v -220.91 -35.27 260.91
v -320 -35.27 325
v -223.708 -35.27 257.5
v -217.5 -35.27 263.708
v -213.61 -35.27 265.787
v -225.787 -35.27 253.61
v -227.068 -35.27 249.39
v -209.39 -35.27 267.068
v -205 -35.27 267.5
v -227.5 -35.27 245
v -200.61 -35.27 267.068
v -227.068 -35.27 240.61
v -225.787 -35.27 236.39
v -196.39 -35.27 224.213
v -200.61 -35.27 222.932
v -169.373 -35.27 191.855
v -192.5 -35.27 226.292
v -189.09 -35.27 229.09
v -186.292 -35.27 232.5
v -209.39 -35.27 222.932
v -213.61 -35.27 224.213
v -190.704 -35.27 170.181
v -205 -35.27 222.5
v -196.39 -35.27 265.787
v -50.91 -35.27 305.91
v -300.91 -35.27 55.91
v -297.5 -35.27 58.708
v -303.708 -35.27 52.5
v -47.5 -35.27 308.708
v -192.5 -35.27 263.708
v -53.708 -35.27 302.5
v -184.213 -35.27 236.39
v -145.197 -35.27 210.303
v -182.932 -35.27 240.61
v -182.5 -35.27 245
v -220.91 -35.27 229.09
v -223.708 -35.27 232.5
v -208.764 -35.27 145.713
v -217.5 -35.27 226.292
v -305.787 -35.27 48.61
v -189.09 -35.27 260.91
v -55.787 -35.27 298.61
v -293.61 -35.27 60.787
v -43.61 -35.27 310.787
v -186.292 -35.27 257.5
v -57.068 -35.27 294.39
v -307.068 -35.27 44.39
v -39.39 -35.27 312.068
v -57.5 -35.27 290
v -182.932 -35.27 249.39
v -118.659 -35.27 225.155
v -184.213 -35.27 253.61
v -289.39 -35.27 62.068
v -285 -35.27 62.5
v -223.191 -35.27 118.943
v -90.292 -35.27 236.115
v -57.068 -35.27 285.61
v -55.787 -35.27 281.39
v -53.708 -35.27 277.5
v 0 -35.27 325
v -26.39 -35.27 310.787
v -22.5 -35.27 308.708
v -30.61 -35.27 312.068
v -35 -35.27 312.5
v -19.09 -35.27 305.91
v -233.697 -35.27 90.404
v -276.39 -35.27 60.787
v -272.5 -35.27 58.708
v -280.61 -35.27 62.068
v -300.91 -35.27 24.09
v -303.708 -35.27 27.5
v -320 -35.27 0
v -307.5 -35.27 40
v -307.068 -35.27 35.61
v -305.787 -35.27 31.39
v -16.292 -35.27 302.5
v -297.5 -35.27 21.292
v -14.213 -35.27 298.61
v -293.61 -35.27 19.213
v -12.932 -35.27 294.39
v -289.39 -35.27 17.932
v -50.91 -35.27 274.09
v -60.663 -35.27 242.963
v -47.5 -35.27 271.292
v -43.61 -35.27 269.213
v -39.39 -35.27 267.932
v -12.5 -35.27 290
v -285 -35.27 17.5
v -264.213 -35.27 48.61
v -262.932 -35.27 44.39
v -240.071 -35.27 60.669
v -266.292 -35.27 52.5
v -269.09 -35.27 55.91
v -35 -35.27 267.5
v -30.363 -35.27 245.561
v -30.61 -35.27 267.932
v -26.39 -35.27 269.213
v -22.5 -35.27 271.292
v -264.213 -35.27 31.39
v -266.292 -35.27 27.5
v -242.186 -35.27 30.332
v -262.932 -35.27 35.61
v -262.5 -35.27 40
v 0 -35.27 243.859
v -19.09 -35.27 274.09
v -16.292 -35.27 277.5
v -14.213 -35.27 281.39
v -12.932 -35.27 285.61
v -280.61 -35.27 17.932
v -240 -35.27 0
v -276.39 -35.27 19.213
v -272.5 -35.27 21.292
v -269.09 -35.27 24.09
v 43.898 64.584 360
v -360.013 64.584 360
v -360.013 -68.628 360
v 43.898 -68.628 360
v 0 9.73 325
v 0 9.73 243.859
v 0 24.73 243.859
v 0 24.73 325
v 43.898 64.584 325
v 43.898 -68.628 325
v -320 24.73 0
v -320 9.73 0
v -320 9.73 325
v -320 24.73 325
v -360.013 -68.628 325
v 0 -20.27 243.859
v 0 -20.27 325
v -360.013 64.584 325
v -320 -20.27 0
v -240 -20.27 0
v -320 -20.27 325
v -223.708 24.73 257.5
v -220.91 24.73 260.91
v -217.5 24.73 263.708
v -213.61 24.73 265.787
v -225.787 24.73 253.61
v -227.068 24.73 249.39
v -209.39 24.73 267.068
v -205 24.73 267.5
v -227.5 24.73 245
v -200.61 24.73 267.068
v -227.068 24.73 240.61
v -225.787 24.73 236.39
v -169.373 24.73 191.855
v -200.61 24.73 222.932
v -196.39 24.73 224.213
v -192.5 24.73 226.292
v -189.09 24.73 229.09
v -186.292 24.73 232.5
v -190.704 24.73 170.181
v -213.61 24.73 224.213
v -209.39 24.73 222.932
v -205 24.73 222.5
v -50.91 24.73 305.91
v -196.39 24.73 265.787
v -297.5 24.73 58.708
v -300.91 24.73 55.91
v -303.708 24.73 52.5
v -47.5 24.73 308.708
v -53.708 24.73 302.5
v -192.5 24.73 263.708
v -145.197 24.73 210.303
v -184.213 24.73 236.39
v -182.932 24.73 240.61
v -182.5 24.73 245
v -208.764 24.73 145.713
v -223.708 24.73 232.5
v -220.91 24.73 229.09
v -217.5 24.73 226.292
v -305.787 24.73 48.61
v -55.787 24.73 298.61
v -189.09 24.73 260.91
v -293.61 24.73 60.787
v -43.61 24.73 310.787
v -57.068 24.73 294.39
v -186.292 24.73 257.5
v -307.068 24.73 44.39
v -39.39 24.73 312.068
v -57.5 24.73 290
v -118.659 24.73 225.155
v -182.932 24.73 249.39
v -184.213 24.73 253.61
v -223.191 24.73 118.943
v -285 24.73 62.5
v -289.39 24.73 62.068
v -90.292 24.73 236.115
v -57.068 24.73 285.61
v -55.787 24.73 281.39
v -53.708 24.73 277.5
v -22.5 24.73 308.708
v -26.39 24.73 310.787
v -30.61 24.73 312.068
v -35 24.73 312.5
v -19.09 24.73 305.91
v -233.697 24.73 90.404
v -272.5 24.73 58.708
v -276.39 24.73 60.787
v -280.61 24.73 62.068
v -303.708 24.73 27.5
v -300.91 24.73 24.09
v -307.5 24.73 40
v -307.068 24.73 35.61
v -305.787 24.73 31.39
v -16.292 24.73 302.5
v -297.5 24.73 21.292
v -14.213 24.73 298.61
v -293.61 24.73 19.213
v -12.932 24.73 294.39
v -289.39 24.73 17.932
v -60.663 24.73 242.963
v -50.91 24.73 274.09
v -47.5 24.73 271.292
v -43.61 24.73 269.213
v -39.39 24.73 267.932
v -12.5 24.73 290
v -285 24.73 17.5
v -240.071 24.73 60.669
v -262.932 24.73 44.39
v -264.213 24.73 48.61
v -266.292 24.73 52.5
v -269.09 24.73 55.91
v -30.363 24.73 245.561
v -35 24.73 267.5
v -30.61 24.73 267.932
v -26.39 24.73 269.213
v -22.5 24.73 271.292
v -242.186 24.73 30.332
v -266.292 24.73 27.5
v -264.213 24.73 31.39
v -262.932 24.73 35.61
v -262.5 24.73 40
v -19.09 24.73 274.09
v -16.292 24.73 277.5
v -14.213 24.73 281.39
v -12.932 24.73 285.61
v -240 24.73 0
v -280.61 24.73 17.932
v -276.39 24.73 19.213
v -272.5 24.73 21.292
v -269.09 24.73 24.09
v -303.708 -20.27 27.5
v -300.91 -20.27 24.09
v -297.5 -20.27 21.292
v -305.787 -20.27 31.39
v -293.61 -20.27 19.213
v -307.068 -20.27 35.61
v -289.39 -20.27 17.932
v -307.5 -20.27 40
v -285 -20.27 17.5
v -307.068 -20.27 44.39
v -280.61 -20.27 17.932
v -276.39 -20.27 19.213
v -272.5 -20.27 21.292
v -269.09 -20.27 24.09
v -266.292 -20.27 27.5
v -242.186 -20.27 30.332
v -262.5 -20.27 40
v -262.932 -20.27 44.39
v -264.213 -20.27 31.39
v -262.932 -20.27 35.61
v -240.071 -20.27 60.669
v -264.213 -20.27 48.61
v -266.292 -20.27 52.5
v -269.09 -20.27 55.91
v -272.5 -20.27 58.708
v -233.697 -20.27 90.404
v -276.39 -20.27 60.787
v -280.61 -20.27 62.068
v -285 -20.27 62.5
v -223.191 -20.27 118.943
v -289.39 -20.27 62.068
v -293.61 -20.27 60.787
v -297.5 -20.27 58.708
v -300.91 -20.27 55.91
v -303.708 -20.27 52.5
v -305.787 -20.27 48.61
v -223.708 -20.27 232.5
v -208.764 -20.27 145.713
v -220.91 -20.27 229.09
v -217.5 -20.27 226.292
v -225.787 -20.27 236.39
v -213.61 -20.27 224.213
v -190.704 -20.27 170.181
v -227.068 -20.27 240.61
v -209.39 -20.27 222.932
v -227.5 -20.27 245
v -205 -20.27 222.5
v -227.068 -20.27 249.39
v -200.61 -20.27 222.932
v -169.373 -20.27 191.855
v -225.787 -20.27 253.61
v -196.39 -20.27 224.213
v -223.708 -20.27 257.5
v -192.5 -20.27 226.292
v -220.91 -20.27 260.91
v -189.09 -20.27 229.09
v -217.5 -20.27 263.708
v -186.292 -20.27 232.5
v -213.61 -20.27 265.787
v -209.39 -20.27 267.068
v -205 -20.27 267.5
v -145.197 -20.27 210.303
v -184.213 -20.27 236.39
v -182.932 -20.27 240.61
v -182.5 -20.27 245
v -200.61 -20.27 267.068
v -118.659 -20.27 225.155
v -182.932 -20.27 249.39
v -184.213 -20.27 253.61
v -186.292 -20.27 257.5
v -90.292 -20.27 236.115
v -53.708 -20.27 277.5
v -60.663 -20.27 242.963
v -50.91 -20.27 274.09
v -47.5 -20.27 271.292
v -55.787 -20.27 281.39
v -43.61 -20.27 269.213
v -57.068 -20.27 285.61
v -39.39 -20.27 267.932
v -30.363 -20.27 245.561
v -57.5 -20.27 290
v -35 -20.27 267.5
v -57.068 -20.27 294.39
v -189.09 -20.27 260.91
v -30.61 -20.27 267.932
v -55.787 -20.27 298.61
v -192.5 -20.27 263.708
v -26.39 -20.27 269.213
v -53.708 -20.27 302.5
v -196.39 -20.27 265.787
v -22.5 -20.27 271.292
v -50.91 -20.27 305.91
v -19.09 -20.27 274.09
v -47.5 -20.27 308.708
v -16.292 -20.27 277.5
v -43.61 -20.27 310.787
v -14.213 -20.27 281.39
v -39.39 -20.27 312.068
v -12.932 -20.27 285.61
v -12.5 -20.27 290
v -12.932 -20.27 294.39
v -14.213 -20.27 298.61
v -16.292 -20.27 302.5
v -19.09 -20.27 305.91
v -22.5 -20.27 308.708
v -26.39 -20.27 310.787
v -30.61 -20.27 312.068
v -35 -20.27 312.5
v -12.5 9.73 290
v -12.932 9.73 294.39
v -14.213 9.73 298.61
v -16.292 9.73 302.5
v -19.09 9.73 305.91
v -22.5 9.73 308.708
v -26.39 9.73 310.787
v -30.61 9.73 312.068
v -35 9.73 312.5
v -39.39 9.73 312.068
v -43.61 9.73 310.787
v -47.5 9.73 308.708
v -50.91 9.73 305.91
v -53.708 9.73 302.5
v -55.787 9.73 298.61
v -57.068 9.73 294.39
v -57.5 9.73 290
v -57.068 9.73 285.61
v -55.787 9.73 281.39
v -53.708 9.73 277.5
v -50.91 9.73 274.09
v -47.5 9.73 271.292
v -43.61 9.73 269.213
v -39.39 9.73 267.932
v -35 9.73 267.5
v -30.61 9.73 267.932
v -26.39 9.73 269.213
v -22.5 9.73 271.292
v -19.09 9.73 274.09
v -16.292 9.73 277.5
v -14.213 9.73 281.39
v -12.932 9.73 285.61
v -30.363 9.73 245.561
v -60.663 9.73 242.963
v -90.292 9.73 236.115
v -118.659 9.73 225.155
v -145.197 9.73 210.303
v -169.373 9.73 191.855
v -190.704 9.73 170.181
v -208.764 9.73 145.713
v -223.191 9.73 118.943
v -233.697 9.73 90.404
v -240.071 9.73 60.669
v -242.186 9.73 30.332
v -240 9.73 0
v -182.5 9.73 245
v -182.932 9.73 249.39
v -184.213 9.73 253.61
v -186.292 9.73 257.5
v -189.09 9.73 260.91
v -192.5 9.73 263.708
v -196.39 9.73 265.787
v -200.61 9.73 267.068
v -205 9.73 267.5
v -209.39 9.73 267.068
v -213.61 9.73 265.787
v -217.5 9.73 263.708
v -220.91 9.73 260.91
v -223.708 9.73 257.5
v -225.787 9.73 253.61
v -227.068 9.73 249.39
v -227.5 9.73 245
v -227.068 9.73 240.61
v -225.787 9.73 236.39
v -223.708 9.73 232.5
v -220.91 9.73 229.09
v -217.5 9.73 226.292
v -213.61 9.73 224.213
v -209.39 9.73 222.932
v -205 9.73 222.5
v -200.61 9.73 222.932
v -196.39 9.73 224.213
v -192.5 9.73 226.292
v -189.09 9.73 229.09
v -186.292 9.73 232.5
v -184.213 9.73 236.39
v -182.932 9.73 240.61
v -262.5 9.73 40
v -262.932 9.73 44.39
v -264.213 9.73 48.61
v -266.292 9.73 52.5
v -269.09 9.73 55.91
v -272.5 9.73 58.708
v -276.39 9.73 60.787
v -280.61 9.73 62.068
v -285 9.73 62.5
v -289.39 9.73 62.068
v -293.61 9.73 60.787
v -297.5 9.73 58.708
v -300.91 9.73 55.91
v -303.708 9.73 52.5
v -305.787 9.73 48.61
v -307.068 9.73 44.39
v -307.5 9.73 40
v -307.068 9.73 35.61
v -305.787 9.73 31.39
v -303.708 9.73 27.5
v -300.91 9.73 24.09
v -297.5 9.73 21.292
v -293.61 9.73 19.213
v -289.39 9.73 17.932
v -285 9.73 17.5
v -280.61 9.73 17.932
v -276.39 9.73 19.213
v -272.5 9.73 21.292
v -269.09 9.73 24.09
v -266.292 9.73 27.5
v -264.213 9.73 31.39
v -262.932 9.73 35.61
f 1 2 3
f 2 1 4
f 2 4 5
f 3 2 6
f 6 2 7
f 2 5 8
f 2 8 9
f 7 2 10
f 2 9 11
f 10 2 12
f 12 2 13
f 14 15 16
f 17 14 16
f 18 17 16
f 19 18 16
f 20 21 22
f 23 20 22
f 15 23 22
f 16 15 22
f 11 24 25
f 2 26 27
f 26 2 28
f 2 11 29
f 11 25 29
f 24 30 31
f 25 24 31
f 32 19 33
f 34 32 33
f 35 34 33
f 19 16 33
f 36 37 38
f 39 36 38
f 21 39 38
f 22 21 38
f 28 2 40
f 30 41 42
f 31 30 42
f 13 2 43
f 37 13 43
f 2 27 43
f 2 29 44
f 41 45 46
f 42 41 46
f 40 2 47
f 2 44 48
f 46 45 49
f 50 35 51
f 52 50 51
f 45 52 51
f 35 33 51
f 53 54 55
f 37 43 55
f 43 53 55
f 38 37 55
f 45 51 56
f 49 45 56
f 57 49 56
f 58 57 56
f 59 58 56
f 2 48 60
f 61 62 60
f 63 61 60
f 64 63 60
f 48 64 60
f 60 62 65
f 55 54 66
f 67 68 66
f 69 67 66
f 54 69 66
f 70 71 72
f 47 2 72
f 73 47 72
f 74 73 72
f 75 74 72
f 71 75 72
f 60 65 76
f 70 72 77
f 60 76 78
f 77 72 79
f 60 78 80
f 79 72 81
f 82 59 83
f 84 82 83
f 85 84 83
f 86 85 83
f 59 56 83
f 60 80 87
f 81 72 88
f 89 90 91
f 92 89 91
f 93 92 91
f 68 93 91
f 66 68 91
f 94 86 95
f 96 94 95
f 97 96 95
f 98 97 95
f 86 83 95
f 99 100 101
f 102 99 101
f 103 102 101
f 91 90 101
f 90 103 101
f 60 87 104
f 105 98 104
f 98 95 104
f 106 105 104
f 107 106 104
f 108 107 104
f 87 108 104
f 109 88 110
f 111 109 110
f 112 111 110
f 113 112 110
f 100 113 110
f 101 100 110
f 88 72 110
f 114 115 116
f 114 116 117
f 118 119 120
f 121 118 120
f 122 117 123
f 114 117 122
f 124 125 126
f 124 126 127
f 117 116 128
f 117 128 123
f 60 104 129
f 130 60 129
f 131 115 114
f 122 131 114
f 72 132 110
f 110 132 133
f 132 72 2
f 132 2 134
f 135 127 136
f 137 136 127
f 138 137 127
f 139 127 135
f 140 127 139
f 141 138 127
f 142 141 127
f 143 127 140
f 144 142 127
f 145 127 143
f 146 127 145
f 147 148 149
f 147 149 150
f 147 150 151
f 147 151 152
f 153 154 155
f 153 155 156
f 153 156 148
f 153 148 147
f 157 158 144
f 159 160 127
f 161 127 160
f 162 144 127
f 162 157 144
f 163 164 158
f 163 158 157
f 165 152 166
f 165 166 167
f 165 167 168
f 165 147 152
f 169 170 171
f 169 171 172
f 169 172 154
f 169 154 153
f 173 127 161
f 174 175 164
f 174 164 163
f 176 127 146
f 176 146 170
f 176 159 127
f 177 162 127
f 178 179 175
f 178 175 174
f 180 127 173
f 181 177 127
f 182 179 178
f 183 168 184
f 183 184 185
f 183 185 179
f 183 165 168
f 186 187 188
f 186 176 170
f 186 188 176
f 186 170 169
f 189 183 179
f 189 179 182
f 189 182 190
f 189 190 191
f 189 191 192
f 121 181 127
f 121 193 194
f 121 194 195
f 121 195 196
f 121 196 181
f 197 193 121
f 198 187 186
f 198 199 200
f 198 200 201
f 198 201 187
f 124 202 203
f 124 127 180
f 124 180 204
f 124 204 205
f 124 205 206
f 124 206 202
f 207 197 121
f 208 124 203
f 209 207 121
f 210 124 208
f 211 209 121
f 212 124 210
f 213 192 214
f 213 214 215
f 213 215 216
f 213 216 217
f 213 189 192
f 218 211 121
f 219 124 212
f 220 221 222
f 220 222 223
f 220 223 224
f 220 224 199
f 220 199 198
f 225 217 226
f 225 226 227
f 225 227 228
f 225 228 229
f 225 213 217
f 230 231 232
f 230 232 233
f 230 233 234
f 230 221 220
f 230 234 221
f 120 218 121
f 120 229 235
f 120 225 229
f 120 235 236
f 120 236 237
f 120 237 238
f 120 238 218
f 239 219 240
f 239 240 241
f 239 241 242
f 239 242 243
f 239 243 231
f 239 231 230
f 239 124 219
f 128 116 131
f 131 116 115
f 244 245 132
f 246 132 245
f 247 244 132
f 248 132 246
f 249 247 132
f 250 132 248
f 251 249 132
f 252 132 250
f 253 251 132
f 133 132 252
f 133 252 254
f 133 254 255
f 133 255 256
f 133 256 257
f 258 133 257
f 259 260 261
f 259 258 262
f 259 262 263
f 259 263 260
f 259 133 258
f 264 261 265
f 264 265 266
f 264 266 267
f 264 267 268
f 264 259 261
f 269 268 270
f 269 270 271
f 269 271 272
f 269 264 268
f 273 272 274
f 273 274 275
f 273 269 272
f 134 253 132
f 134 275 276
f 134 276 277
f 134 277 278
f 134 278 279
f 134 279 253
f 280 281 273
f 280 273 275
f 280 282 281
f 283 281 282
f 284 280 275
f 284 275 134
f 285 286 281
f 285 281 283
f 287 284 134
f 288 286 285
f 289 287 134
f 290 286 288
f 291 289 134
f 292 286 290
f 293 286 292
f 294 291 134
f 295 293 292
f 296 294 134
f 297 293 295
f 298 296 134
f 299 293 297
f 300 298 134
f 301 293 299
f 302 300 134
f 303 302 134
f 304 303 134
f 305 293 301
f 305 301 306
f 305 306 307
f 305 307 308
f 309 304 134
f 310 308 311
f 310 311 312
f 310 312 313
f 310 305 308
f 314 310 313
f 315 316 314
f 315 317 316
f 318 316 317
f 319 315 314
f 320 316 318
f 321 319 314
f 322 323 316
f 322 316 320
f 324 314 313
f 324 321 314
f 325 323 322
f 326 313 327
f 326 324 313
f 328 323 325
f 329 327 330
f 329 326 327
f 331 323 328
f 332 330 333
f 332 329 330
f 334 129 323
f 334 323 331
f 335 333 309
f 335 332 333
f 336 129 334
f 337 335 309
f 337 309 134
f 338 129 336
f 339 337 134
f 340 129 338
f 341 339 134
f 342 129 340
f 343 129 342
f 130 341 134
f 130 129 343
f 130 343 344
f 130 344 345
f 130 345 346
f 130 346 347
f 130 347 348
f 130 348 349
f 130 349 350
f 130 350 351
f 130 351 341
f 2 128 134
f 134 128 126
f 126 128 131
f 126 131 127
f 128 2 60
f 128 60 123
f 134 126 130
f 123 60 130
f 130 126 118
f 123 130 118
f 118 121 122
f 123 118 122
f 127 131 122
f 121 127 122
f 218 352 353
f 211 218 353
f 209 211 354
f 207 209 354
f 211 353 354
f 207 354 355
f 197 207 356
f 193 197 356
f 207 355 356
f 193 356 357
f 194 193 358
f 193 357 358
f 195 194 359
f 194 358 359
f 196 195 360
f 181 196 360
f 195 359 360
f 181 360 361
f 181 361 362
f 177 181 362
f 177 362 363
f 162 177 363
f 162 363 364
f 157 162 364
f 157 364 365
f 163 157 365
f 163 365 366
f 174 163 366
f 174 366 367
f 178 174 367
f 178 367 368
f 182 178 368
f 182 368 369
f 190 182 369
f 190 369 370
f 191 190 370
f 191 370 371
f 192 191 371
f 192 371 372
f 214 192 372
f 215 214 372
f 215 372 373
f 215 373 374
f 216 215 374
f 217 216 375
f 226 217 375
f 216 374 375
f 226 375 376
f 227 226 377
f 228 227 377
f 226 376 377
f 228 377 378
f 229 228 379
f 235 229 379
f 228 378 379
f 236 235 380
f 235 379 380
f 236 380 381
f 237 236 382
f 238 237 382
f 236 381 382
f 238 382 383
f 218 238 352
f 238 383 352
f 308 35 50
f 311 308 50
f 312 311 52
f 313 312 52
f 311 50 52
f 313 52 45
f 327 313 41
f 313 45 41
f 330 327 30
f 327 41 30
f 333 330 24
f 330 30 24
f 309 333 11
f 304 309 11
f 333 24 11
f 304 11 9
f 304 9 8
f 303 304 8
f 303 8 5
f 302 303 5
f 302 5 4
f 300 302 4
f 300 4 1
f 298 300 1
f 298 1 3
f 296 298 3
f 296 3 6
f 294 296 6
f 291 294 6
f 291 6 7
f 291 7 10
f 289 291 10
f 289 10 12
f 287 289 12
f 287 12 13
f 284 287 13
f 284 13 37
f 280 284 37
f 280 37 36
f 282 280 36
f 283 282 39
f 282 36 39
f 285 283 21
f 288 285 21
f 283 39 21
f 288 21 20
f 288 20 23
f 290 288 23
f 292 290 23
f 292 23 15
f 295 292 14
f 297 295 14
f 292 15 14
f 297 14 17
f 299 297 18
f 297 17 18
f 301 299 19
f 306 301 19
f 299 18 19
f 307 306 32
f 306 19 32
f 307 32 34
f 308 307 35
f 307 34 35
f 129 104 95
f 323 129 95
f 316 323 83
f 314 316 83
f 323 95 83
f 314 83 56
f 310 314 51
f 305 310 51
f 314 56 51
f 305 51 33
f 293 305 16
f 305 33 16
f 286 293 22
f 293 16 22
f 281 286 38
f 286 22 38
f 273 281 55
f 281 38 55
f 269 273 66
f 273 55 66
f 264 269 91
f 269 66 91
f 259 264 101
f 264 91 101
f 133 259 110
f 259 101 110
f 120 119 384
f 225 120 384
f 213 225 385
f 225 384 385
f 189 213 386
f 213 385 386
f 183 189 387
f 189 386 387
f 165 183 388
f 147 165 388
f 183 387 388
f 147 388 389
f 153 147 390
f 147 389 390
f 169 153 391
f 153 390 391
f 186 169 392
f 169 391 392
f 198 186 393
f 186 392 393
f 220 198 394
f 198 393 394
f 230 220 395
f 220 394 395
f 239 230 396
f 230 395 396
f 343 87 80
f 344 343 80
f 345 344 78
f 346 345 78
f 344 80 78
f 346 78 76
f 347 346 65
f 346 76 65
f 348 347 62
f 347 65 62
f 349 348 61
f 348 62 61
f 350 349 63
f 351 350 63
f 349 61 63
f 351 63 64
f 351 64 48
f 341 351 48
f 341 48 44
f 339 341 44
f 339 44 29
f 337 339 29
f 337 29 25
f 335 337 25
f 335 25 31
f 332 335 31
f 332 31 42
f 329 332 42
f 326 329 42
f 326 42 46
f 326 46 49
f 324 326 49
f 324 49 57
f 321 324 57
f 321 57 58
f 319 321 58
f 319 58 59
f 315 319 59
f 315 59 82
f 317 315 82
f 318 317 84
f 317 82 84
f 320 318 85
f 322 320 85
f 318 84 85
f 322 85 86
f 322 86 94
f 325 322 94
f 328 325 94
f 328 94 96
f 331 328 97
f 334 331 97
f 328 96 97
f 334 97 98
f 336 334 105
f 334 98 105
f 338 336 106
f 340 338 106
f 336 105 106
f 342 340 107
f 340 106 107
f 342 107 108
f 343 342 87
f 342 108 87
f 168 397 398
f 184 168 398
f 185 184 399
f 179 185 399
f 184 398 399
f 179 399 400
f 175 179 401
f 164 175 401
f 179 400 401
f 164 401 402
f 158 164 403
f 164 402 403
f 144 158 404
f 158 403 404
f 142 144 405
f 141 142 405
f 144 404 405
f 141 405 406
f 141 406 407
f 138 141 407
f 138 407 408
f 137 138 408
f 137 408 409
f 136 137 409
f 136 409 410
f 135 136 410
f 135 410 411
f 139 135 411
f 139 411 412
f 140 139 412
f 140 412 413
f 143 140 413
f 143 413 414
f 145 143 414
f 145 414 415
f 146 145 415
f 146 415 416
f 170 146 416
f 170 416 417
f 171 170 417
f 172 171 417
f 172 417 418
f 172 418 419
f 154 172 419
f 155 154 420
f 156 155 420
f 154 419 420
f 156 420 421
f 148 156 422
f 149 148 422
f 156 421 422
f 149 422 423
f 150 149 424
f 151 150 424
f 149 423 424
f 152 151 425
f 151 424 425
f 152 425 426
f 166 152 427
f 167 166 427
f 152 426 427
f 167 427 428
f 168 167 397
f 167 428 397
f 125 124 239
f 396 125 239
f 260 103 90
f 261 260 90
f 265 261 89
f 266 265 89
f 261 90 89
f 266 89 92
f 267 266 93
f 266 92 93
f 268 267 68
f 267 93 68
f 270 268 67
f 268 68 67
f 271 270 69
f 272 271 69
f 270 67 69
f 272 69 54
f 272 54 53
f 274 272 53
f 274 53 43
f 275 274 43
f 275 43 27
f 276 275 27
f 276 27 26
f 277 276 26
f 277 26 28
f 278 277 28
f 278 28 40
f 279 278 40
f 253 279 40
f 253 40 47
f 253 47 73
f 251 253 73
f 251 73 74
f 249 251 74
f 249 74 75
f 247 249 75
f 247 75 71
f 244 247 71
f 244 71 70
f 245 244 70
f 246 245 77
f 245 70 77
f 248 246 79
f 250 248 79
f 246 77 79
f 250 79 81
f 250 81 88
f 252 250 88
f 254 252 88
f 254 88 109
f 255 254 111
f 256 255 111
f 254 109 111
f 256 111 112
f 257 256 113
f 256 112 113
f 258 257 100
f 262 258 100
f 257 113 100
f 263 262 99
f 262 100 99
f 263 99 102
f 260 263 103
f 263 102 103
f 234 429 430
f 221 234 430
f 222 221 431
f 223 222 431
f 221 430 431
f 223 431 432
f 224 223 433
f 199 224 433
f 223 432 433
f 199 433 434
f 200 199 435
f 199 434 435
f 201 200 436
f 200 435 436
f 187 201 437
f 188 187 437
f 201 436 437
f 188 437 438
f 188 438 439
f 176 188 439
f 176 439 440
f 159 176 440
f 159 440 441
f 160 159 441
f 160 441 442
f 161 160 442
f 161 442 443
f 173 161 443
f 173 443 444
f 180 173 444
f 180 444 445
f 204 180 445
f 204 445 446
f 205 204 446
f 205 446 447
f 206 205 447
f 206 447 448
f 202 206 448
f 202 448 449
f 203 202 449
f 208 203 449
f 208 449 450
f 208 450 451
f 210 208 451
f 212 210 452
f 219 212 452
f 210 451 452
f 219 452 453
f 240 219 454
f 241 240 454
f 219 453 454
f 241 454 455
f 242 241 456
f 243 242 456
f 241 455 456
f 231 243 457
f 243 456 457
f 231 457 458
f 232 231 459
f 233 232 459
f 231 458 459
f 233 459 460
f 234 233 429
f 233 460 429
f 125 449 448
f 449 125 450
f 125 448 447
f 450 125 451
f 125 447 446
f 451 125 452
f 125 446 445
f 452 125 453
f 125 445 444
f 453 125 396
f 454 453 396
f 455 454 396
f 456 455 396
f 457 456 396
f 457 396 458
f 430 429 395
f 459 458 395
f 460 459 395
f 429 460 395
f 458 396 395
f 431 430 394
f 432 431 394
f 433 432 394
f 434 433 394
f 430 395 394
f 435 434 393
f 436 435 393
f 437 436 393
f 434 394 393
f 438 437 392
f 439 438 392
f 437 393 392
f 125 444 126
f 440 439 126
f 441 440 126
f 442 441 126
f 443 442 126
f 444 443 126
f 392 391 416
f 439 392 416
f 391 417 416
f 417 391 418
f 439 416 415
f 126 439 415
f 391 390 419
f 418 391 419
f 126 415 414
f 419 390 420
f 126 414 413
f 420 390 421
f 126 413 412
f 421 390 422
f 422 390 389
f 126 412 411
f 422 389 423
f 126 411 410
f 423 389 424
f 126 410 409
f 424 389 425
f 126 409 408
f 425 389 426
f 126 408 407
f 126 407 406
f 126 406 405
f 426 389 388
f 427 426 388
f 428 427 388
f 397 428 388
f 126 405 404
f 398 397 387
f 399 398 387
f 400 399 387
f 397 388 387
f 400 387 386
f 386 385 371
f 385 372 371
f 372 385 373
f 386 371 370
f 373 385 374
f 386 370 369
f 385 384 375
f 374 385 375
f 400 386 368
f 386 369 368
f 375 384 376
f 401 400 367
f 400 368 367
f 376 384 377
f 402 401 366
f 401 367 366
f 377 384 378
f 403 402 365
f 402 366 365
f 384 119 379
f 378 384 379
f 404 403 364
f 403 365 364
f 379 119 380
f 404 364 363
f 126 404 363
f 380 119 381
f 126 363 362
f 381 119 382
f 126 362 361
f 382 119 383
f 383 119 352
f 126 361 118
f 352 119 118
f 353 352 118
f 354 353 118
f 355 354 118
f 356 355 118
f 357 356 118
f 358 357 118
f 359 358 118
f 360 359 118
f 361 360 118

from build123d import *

# Parameters (mm, degrees)
F0_W     = 320
F0_H     = 60
F1_DEPTH = 360
F2_R     = 22.5
F3_DEPTH = 60
F5_DEPTH = 60
F6_W     = 403.911207
F6_H     = 133.211269
F6_W_2   = 320
F6_H_2   = 60
F7_DEPTH = 35
F8_W     = 30
F8_H     = 325
F9_DEPTH = 320


with BuildPart() as f1:
    # F0 (on Top) → F1 (new body)
    with BuildSketch(Plane.XY):
        with Locations((-160, -5.27027)):
            Rectangle(F0_W, F0_H)
    extrude(amount=F1_DEPTH)

    # F2 (on face) → F3 (cut, through all)
    with BuildSketch(Plane.XZ.offset(35.27027)):
        with Locations((-285, 40)):
            Circle(F2_R)
        with Locations((-35, 290)):
            Circle(F2_R)
        with Locations((-205, 245)):
            Circle(F2_R)
    extrude(amount=-F3_DEPTH, mode=Mode.SUBTRACT)

    # F4 (on face) → F5 (cut, through all)
    with BuildSketch(Plane.XZ.offset(35.27027)):
        Polygon((0, 243.859082), (-27.186546, 30.584865), (-240, 0), (0, 0), align=None)
        with BuildLine():
            Line((-240, 0), (-27.186546, 30.584865))
            Line((-27.186546, 30.584865), (0, 243.859082))
            ThreePointArc((0, 243.859082), (-180.42215, 181.395507), (-240, 0))
        make_face()
    extrude(amount=-F5_DEPTH, mode=Mode.SUBTRACT)

    # F6 (on face) → F7 (join)
    with BuildSketch(Plane.XY.offset(360)):
        with Locations((-158.057762, -2.021872)):
            Rectangle(F6_W, F6_H)
        with Locations((-160, -5.27027)):
            Rectangle(F6_W_2, F6_H_2, mode=Mode.SUBTRACT)
    extrude(amount=-F7_DEPTH)

    # F8 (on face) → F9 (cut, through all)
    with BuildSketch(Plane.YZ):
        with Locations((-5.27027, 162.5)):
            Rectangle(F8_W, F8_H)
    extrude(amount=-F9_DEPTH, mode=Mode.SUBTRACT)


solid = f1.part
